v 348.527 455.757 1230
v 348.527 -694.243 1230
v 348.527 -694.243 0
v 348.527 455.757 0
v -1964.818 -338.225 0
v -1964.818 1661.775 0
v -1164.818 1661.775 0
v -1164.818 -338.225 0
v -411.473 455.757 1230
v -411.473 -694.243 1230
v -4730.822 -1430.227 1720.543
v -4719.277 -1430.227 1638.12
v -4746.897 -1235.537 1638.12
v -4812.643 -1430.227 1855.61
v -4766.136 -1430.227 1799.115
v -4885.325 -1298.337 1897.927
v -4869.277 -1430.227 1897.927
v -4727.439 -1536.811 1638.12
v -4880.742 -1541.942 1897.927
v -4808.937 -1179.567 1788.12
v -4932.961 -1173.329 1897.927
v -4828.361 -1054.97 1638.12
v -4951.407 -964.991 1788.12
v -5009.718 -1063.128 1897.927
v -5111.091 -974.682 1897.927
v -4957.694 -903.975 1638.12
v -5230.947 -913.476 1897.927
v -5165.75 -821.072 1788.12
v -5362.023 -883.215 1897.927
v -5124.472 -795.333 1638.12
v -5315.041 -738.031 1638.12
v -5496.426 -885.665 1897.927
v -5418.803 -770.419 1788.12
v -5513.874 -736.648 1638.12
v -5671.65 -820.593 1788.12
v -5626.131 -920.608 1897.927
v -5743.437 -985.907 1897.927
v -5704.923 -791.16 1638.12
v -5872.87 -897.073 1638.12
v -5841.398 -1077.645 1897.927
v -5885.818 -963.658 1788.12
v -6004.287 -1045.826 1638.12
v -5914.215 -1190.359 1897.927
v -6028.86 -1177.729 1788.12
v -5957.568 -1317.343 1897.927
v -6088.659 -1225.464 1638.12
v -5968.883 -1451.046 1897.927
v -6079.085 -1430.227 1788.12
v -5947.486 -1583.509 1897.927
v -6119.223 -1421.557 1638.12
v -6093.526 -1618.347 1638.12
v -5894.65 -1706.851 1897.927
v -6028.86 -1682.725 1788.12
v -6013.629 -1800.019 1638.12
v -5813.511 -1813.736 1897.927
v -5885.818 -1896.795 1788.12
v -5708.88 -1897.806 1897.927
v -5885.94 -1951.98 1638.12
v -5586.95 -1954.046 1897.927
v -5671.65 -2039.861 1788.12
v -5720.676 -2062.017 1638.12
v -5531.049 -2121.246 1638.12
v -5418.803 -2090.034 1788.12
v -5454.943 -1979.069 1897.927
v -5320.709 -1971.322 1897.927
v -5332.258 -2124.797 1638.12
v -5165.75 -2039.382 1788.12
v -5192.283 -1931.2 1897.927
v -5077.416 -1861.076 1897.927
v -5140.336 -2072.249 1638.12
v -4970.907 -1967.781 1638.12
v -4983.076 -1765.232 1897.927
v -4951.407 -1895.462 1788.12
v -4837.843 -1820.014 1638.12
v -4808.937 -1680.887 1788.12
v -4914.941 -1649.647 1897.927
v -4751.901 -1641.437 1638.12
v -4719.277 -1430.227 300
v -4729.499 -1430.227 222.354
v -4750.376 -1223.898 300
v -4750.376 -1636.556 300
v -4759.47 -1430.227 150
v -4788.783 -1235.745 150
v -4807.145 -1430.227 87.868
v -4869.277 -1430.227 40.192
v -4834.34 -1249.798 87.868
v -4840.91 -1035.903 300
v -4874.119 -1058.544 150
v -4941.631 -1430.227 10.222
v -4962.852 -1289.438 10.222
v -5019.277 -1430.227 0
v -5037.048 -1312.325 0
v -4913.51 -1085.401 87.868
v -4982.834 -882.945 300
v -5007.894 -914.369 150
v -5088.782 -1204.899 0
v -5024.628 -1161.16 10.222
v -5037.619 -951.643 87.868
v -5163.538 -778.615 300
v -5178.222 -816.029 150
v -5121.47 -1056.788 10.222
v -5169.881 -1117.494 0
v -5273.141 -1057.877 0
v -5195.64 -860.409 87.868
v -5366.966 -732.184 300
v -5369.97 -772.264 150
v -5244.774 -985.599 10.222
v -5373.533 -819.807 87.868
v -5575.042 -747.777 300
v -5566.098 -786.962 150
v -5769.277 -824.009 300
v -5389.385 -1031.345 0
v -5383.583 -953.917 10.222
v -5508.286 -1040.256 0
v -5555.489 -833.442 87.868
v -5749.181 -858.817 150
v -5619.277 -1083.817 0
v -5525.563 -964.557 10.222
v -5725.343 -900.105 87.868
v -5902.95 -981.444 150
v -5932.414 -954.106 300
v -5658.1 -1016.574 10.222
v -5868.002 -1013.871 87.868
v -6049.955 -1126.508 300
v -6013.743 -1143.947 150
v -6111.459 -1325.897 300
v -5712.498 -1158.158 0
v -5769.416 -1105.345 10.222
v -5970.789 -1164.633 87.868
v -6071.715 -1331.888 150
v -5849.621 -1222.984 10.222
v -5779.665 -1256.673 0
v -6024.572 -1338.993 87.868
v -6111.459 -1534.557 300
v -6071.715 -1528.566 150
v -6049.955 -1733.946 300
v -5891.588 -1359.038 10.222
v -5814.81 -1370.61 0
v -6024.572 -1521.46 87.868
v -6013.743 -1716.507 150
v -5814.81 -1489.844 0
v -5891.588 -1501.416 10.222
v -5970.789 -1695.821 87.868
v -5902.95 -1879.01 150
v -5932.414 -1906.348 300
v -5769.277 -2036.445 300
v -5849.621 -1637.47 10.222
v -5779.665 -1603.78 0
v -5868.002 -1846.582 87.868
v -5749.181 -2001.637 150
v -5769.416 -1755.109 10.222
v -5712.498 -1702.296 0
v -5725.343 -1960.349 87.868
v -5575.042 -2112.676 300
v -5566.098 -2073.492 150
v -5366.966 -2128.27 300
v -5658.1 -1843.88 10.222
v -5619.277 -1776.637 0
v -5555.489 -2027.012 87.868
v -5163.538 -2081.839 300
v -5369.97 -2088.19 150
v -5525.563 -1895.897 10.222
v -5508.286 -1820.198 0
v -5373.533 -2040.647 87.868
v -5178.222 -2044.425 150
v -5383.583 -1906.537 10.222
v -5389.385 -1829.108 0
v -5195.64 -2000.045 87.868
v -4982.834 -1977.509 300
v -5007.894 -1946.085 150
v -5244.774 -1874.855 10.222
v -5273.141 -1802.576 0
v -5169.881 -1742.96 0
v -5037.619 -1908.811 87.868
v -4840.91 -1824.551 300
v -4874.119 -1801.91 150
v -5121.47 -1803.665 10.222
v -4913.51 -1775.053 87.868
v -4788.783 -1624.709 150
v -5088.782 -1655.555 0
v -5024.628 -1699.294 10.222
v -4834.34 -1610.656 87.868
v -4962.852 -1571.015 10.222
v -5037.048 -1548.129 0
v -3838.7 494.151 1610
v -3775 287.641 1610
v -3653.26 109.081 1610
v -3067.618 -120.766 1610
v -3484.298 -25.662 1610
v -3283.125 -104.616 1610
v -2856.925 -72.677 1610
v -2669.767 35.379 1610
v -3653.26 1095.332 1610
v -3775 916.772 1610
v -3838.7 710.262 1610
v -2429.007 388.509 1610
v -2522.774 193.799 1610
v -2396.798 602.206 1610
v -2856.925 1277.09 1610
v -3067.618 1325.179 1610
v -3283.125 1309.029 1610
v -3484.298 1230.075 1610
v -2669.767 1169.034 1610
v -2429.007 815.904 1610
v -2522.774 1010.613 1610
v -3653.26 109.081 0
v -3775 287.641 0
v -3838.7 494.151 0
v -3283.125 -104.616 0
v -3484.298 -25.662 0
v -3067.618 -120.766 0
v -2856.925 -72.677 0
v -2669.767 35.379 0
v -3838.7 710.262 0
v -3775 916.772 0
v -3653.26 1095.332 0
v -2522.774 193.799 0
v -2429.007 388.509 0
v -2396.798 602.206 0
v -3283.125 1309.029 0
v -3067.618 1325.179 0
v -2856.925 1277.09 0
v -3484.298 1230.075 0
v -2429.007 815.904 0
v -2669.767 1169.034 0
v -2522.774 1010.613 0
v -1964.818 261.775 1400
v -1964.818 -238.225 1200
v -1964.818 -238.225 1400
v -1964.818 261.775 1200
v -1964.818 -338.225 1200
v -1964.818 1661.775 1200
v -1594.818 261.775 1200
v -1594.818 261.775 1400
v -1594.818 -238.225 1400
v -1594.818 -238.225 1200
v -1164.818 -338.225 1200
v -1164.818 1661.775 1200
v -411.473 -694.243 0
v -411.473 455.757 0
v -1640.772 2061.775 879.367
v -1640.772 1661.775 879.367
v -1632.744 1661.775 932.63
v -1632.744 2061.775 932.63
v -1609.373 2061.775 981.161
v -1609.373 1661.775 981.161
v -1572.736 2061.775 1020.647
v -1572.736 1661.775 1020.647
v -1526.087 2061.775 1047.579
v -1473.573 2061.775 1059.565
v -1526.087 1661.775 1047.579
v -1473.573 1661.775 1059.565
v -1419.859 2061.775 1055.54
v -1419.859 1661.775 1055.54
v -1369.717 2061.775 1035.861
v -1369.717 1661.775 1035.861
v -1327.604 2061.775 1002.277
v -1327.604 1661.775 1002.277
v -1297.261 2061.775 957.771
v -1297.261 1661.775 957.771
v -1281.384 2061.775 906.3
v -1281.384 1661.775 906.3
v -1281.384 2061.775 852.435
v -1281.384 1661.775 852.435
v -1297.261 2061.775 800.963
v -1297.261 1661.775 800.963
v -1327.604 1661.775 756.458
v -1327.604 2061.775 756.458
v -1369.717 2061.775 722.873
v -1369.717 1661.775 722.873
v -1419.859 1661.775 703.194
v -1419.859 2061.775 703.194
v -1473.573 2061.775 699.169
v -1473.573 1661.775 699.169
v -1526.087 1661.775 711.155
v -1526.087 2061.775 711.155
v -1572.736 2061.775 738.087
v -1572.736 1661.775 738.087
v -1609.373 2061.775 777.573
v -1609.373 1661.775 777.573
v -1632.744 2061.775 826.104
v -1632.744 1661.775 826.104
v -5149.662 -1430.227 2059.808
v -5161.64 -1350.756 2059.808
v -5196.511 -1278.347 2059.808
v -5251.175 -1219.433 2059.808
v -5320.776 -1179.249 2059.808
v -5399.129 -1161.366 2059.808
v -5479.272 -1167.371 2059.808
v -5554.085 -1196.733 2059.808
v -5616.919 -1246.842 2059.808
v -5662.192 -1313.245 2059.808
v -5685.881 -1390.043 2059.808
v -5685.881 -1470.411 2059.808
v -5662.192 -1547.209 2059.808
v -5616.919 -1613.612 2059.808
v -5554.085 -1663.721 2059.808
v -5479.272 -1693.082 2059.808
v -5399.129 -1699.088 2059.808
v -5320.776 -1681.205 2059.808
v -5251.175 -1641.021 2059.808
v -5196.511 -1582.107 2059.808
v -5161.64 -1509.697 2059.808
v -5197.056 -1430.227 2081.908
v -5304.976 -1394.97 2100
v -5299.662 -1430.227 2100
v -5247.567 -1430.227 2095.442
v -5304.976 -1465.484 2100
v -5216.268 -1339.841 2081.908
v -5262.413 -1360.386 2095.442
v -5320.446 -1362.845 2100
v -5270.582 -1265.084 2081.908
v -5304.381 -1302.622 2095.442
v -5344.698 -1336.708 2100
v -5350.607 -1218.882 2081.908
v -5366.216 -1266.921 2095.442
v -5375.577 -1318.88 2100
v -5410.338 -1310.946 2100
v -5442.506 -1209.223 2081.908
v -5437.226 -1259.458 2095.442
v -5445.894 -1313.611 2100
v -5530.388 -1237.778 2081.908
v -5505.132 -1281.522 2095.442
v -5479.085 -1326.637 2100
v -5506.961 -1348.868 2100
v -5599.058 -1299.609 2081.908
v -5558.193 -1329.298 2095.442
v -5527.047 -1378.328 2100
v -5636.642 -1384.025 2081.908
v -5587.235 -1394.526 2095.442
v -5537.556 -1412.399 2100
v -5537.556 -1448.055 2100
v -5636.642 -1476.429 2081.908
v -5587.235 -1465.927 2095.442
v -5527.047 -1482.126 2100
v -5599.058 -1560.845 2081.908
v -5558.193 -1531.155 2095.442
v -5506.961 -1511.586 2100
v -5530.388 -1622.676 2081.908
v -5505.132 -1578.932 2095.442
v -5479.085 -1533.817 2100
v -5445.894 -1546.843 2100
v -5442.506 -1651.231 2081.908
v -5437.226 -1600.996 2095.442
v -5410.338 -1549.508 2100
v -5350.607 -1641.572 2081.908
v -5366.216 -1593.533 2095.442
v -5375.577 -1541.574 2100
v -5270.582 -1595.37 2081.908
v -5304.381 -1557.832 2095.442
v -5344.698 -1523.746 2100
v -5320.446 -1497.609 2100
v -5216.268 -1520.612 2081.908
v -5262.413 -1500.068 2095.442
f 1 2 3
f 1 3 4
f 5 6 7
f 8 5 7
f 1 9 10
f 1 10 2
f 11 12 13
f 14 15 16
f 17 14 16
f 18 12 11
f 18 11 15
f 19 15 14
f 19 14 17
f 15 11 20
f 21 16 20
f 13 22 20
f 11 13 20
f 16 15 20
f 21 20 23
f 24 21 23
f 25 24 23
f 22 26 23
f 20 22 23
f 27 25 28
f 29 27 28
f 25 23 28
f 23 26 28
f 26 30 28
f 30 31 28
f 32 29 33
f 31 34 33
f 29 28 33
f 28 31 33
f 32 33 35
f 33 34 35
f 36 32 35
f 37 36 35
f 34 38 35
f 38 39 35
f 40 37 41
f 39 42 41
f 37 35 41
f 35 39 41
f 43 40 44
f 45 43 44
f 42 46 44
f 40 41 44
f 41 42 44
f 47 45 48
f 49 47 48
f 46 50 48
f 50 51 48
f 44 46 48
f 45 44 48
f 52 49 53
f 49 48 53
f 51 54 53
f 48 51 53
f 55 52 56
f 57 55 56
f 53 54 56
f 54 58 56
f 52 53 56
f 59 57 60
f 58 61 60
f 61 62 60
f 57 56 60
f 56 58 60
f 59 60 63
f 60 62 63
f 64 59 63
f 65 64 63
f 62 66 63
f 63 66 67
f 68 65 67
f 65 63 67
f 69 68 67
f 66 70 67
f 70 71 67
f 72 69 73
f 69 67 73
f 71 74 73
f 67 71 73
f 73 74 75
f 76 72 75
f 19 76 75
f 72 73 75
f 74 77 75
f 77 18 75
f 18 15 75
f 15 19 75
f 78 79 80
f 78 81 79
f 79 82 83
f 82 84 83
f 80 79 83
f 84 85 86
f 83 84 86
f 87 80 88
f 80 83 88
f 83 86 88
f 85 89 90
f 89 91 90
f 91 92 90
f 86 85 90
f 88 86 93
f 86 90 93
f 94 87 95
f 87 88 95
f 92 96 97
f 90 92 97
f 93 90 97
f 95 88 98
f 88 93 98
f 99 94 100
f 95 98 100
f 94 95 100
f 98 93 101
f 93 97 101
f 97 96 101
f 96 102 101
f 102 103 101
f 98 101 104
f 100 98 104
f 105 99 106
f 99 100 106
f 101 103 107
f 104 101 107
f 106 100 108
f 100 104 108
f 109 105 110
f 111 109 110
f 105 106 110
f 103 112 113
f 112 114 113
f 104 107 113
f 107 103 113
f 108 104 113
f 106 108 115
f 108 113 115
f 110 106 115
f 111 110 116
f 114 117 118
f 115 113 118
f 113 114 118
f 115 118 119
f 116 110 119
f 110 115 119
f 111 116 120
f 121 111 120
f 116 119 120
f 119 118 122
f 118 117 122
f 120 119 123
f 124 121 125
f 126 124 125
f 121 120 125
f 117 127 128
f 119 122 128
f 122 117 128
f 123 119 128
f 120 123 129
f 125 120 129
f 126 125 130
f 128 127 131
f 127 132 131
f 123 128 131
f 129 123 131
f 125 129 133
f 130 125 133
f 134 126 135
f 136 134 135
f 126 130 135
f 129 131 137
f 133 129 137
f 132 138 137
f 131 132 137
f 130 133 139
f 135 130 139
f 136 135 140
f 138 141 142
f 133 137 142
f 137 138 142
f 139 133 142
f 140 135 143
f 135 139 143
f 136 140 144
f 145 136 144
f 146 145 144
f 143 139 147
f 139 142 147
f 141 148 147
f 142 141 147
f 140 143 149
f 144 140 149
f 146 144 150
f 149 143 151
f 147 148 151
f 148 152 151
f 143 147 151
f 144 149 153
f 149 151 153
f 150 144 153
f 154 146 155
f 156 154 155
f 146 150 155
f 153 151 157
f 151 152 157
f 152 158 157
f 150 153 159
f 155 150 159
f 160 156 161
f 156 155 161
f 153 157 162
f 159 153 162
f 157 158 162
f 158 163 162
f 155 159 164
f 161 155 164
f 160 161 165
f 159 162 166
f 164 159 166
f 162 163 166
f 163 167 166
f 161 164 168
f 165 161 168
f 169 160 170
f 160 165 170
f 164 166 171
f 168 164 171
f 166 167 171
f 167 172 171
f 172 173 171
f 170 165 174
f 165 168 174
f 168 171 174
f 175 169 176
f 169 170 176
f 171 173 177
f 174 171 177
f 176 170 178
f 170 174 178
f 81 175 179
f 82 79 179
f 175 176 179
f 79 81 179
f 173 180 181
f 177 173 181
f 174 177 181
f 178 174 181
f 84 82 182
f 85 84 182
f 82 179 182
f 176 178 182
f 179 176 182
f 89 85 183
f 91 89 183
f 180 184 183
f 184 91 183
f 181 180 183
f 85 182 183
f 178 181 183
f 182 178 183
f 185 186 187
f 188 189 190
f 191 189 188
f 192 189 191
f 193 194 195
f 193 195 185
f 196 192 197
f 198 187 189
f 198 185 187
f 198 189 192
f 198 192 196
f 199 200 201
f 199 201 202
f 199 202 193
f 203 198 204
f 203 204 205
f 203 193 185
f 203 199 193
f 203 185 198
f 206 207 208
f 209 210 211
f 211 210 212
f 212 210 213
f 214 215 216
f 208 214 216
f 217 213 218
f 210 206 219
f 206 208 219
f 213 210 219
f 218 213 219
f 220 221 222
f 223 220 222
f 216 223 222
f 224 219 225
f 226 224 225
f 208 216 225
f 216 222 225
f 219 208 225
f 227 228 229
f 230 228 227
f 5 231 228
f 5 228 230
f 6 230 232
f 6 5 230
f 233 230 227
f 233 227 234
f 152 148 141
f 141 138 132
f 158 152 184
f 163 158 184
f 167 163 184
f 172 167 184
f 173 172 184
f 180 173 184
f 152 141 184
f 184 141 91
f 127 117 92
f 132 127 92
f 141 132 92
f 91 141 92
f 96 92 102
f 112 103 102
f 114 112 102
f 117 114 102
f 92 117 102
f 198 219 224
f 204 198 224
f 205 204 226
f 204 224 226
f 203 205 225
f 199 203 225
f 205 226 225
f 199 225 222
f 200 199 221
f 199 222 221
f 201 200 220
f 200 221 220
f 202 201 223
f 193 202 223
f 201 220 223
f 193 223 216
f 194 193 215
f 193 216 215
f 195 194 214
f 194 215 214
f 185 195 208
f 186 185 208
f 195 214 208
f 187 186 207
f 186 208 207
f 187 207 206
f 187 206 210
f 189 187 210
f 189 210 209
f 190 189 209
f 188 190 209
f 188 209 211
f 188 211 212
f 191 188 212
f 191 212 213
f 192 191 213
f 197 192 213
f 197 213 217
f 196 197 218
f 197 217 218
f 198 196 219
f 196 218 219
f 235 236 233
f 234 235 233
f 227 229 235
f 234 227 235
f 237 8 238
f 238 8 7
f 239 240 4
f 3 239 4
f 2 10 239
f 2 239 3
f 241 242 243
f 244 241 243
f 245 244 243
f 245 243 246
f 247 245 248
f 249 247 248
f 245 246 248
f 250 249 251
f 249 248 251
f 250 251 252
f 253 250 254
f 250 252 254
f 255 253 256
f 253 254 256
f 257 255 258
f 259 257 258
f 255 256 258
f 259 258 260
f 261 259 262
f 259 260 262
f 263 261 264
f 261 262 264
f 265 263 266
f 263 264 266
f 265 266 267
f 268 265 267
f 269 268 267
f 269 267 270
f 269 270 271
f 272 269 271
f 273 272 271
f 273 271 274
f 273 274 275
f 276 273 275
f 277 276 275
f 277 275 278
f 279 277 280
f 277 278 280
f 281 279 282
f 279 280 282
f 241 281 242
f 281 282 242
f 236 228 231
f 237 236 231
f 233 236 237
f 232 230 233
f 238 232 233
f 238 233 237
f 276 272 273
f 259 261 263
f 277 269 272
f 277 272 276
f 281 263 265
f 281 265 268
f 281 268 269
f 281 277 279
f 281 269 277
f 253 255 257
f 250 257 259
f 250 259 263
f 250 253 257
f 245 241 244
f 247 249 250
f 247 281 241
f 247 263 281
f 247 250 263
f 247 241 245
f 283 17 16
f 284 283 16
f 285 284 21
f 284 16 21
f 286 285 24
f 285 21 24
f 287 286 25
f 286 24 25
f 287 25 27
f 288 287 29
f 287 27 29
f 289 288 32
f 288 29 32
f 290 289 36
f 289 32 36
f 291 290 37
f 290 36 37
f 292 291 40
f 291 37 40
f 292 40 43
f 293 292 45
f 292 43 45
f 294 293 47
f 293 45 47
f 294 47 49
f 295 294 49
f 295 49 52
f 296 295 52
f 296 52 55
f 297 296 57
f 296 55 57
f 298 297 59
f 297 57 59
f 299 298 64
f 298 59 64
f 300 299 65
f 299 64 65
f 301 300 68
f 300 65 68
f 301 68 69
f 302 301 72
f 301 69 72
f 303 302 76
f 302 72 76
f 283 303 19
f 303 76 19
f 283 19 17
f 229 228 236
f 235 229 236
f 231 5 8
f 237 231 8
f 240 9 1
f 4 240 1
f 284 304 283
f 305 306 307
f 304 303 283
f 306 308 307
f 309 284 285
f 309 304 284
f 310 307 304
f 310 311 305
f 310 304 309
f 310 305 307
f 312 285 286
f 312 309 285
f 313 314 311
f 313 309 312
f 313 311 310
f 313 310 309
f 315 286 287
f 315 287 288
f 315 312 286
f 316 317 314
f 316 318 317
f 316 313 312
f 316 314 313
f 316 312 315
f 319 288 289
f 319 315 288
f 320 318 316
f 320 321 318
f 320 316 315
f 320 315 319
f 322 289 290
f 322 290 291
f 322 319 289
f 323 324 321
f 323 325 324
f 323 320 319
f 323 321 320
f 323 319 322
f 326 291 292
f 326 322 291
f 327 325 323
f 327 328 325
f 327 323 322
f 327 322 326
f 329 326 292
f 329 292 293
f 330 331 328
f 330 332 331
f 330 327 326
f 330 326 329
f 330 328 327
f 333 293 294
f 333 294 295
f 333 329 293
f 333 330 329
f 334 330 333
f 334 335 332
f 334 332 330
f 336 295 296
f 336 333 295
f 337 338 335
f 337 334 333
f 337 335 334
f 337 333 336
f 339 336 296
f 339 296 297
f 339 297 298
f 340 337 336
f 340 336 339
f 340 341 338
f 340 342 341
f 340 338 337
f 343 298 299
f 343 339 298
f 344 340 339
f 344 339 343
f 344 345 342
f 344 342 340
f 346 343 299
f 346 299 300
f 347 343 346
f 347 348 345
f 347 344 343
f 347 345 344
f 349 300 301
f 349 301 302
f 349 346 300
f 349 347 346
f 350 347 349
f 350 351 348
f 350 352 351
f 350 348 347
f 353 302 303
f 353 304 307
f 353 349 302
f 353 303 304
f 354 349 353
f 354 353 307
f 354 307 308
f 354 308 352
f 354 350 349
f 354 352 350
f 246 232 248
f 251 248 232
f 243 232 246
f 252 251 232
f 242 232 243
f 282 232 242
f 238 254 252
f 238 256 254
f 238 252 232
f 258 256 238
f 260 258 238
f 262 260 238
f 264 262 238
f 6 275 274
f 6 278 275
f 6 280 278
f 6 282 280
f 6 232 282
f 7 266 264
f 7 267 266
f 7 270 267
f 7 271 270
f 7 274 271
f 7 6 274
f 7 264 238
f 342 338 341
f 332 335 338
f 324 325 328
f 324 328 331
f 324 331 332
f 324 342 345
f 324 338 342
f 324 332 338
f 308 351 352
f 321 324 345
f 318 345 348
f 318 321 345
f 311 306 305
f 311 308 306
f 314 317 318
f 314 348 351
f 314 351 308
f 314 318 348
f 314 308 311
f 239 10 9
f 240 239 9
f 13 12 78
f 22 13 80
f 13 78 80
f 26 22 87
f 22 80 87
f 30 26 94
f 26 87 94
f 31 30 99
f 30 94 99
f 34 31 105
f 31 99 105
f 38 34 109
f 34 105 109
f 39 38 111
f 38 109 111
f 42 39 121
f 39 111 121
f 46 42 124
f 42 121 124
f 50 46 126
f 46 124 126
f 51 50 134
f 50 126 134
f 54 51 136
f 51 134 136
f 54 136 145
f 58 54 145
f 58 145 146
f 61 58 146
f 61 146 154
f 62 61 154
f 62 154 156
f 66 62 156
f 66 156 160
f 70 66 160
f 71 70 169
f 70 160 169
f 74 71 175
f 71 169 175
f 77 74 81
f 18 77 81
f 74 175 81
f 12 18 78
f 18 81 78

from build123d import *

# Parameters (mm, degrees)
F0_W      = 760
F0_H      = 1150
F1_DEPTH  = 1230
F2_R      = 725
F3_DEPTH  = 1610
F4_W      = 800
F4_H      = 2000
F5_DEPTH  = 1200
F6_W      = 370
F6_H      = 500
F7_DEPTH  = 200
F8_R      = 700
F9_DEPTH  = 2100
F10_R     = 300
F11_SIZE2 = 288.6751345948
F11_SIZE  = 500
F12_R     = 300
F13_R     = 180.7034135945
F14_DEPTH = 400


with BuildPart() as f1:
    # F0 (on Top) → F1 (new body)
    with BuildSketch(Plane.XY):
        with Locations((-31.4733404666, -119.2426998605)):
            Rectangle(F0_W, F0_H)
    extrude(amount=F1_DEPTH)


with BuildPart() as f3:
    # F2 (on Top) → F3 (new body)
    with BuildSketch(Plane.XY):
        with Locations((-3121.7975616455, 602.2063493729)):
            Circle(F2_R)
    extrude(amount=F3_DEPTH)


with BuildPart() as f5:
    # F4 (on Top) → F5 (new body)
    with BuildSketch(Plane.XY):
        with Locations((-1564.8182034492, 661.7751377383)):
            Rectangle(F4_W, F4_H)
    extrude(amount=F5_DEPTH)

    # F6 (on face) → F7 (join)
    with BuildSketch(Plane.XY.offset(1200)):
        with Locations((-1779.8182034492, 11.7751377383)):
            Rectangle(F6_W, F6_H)
    extrude(amount=F7_DEPTH)

    # F13 (on face) → F14 (join)
    with BuildSketch(Plane(origin=(0, 1661.7751377383, 0), x_dir=(-1, 0, 0), z_dir=(0, 1, 0))):
        with Locations((1460.068821907, 879.3671131134)):
            Circle(F13_R)
    extrude(amount=F14_DEPTH)


with BuildPart() as f9:
    # F8 (on Top) → F9 (new body)
    with BuildSketch(Plane.XY):
        with Locations((-5419.2771911621, -1430.2269220352)):
            Circle(F8_R)
    extrude(amount=F9_DEPTH)

    # F10
    f10_edges = [f9.edges().sort_by_distance(p)[0] for p in [
        (-6119.277191, -1430.226922, 0),
    ]]
    fillet(f10_edges, radius=F10_R)

    # F11
    f11_edges = [f9.edges().sort_by_distance(p)[0] for p in [
        (-6119.277191, -1430.226922, 2100),
    ]]
    f11_side = f9.faces().sort_by_distance((-5419.277191, -1430.226922, 2100))[0]
    chamfer(f11_edges, length=F11_SIZE, length2=F11_SIZE2, reference=f11_side)

    # F12
    f12_edges = [f9.edges().sort_by_distance(p)[0] for p in [
        (-6119.277191, -1430.226922, 1811.324865),
        (-5619.277191, -1430.226922, 2100),
    ]]
    fillet(f12_edges, radius=F12_R)


solid = Compound([f1.part, f3.part, f5.part, f9.part])
